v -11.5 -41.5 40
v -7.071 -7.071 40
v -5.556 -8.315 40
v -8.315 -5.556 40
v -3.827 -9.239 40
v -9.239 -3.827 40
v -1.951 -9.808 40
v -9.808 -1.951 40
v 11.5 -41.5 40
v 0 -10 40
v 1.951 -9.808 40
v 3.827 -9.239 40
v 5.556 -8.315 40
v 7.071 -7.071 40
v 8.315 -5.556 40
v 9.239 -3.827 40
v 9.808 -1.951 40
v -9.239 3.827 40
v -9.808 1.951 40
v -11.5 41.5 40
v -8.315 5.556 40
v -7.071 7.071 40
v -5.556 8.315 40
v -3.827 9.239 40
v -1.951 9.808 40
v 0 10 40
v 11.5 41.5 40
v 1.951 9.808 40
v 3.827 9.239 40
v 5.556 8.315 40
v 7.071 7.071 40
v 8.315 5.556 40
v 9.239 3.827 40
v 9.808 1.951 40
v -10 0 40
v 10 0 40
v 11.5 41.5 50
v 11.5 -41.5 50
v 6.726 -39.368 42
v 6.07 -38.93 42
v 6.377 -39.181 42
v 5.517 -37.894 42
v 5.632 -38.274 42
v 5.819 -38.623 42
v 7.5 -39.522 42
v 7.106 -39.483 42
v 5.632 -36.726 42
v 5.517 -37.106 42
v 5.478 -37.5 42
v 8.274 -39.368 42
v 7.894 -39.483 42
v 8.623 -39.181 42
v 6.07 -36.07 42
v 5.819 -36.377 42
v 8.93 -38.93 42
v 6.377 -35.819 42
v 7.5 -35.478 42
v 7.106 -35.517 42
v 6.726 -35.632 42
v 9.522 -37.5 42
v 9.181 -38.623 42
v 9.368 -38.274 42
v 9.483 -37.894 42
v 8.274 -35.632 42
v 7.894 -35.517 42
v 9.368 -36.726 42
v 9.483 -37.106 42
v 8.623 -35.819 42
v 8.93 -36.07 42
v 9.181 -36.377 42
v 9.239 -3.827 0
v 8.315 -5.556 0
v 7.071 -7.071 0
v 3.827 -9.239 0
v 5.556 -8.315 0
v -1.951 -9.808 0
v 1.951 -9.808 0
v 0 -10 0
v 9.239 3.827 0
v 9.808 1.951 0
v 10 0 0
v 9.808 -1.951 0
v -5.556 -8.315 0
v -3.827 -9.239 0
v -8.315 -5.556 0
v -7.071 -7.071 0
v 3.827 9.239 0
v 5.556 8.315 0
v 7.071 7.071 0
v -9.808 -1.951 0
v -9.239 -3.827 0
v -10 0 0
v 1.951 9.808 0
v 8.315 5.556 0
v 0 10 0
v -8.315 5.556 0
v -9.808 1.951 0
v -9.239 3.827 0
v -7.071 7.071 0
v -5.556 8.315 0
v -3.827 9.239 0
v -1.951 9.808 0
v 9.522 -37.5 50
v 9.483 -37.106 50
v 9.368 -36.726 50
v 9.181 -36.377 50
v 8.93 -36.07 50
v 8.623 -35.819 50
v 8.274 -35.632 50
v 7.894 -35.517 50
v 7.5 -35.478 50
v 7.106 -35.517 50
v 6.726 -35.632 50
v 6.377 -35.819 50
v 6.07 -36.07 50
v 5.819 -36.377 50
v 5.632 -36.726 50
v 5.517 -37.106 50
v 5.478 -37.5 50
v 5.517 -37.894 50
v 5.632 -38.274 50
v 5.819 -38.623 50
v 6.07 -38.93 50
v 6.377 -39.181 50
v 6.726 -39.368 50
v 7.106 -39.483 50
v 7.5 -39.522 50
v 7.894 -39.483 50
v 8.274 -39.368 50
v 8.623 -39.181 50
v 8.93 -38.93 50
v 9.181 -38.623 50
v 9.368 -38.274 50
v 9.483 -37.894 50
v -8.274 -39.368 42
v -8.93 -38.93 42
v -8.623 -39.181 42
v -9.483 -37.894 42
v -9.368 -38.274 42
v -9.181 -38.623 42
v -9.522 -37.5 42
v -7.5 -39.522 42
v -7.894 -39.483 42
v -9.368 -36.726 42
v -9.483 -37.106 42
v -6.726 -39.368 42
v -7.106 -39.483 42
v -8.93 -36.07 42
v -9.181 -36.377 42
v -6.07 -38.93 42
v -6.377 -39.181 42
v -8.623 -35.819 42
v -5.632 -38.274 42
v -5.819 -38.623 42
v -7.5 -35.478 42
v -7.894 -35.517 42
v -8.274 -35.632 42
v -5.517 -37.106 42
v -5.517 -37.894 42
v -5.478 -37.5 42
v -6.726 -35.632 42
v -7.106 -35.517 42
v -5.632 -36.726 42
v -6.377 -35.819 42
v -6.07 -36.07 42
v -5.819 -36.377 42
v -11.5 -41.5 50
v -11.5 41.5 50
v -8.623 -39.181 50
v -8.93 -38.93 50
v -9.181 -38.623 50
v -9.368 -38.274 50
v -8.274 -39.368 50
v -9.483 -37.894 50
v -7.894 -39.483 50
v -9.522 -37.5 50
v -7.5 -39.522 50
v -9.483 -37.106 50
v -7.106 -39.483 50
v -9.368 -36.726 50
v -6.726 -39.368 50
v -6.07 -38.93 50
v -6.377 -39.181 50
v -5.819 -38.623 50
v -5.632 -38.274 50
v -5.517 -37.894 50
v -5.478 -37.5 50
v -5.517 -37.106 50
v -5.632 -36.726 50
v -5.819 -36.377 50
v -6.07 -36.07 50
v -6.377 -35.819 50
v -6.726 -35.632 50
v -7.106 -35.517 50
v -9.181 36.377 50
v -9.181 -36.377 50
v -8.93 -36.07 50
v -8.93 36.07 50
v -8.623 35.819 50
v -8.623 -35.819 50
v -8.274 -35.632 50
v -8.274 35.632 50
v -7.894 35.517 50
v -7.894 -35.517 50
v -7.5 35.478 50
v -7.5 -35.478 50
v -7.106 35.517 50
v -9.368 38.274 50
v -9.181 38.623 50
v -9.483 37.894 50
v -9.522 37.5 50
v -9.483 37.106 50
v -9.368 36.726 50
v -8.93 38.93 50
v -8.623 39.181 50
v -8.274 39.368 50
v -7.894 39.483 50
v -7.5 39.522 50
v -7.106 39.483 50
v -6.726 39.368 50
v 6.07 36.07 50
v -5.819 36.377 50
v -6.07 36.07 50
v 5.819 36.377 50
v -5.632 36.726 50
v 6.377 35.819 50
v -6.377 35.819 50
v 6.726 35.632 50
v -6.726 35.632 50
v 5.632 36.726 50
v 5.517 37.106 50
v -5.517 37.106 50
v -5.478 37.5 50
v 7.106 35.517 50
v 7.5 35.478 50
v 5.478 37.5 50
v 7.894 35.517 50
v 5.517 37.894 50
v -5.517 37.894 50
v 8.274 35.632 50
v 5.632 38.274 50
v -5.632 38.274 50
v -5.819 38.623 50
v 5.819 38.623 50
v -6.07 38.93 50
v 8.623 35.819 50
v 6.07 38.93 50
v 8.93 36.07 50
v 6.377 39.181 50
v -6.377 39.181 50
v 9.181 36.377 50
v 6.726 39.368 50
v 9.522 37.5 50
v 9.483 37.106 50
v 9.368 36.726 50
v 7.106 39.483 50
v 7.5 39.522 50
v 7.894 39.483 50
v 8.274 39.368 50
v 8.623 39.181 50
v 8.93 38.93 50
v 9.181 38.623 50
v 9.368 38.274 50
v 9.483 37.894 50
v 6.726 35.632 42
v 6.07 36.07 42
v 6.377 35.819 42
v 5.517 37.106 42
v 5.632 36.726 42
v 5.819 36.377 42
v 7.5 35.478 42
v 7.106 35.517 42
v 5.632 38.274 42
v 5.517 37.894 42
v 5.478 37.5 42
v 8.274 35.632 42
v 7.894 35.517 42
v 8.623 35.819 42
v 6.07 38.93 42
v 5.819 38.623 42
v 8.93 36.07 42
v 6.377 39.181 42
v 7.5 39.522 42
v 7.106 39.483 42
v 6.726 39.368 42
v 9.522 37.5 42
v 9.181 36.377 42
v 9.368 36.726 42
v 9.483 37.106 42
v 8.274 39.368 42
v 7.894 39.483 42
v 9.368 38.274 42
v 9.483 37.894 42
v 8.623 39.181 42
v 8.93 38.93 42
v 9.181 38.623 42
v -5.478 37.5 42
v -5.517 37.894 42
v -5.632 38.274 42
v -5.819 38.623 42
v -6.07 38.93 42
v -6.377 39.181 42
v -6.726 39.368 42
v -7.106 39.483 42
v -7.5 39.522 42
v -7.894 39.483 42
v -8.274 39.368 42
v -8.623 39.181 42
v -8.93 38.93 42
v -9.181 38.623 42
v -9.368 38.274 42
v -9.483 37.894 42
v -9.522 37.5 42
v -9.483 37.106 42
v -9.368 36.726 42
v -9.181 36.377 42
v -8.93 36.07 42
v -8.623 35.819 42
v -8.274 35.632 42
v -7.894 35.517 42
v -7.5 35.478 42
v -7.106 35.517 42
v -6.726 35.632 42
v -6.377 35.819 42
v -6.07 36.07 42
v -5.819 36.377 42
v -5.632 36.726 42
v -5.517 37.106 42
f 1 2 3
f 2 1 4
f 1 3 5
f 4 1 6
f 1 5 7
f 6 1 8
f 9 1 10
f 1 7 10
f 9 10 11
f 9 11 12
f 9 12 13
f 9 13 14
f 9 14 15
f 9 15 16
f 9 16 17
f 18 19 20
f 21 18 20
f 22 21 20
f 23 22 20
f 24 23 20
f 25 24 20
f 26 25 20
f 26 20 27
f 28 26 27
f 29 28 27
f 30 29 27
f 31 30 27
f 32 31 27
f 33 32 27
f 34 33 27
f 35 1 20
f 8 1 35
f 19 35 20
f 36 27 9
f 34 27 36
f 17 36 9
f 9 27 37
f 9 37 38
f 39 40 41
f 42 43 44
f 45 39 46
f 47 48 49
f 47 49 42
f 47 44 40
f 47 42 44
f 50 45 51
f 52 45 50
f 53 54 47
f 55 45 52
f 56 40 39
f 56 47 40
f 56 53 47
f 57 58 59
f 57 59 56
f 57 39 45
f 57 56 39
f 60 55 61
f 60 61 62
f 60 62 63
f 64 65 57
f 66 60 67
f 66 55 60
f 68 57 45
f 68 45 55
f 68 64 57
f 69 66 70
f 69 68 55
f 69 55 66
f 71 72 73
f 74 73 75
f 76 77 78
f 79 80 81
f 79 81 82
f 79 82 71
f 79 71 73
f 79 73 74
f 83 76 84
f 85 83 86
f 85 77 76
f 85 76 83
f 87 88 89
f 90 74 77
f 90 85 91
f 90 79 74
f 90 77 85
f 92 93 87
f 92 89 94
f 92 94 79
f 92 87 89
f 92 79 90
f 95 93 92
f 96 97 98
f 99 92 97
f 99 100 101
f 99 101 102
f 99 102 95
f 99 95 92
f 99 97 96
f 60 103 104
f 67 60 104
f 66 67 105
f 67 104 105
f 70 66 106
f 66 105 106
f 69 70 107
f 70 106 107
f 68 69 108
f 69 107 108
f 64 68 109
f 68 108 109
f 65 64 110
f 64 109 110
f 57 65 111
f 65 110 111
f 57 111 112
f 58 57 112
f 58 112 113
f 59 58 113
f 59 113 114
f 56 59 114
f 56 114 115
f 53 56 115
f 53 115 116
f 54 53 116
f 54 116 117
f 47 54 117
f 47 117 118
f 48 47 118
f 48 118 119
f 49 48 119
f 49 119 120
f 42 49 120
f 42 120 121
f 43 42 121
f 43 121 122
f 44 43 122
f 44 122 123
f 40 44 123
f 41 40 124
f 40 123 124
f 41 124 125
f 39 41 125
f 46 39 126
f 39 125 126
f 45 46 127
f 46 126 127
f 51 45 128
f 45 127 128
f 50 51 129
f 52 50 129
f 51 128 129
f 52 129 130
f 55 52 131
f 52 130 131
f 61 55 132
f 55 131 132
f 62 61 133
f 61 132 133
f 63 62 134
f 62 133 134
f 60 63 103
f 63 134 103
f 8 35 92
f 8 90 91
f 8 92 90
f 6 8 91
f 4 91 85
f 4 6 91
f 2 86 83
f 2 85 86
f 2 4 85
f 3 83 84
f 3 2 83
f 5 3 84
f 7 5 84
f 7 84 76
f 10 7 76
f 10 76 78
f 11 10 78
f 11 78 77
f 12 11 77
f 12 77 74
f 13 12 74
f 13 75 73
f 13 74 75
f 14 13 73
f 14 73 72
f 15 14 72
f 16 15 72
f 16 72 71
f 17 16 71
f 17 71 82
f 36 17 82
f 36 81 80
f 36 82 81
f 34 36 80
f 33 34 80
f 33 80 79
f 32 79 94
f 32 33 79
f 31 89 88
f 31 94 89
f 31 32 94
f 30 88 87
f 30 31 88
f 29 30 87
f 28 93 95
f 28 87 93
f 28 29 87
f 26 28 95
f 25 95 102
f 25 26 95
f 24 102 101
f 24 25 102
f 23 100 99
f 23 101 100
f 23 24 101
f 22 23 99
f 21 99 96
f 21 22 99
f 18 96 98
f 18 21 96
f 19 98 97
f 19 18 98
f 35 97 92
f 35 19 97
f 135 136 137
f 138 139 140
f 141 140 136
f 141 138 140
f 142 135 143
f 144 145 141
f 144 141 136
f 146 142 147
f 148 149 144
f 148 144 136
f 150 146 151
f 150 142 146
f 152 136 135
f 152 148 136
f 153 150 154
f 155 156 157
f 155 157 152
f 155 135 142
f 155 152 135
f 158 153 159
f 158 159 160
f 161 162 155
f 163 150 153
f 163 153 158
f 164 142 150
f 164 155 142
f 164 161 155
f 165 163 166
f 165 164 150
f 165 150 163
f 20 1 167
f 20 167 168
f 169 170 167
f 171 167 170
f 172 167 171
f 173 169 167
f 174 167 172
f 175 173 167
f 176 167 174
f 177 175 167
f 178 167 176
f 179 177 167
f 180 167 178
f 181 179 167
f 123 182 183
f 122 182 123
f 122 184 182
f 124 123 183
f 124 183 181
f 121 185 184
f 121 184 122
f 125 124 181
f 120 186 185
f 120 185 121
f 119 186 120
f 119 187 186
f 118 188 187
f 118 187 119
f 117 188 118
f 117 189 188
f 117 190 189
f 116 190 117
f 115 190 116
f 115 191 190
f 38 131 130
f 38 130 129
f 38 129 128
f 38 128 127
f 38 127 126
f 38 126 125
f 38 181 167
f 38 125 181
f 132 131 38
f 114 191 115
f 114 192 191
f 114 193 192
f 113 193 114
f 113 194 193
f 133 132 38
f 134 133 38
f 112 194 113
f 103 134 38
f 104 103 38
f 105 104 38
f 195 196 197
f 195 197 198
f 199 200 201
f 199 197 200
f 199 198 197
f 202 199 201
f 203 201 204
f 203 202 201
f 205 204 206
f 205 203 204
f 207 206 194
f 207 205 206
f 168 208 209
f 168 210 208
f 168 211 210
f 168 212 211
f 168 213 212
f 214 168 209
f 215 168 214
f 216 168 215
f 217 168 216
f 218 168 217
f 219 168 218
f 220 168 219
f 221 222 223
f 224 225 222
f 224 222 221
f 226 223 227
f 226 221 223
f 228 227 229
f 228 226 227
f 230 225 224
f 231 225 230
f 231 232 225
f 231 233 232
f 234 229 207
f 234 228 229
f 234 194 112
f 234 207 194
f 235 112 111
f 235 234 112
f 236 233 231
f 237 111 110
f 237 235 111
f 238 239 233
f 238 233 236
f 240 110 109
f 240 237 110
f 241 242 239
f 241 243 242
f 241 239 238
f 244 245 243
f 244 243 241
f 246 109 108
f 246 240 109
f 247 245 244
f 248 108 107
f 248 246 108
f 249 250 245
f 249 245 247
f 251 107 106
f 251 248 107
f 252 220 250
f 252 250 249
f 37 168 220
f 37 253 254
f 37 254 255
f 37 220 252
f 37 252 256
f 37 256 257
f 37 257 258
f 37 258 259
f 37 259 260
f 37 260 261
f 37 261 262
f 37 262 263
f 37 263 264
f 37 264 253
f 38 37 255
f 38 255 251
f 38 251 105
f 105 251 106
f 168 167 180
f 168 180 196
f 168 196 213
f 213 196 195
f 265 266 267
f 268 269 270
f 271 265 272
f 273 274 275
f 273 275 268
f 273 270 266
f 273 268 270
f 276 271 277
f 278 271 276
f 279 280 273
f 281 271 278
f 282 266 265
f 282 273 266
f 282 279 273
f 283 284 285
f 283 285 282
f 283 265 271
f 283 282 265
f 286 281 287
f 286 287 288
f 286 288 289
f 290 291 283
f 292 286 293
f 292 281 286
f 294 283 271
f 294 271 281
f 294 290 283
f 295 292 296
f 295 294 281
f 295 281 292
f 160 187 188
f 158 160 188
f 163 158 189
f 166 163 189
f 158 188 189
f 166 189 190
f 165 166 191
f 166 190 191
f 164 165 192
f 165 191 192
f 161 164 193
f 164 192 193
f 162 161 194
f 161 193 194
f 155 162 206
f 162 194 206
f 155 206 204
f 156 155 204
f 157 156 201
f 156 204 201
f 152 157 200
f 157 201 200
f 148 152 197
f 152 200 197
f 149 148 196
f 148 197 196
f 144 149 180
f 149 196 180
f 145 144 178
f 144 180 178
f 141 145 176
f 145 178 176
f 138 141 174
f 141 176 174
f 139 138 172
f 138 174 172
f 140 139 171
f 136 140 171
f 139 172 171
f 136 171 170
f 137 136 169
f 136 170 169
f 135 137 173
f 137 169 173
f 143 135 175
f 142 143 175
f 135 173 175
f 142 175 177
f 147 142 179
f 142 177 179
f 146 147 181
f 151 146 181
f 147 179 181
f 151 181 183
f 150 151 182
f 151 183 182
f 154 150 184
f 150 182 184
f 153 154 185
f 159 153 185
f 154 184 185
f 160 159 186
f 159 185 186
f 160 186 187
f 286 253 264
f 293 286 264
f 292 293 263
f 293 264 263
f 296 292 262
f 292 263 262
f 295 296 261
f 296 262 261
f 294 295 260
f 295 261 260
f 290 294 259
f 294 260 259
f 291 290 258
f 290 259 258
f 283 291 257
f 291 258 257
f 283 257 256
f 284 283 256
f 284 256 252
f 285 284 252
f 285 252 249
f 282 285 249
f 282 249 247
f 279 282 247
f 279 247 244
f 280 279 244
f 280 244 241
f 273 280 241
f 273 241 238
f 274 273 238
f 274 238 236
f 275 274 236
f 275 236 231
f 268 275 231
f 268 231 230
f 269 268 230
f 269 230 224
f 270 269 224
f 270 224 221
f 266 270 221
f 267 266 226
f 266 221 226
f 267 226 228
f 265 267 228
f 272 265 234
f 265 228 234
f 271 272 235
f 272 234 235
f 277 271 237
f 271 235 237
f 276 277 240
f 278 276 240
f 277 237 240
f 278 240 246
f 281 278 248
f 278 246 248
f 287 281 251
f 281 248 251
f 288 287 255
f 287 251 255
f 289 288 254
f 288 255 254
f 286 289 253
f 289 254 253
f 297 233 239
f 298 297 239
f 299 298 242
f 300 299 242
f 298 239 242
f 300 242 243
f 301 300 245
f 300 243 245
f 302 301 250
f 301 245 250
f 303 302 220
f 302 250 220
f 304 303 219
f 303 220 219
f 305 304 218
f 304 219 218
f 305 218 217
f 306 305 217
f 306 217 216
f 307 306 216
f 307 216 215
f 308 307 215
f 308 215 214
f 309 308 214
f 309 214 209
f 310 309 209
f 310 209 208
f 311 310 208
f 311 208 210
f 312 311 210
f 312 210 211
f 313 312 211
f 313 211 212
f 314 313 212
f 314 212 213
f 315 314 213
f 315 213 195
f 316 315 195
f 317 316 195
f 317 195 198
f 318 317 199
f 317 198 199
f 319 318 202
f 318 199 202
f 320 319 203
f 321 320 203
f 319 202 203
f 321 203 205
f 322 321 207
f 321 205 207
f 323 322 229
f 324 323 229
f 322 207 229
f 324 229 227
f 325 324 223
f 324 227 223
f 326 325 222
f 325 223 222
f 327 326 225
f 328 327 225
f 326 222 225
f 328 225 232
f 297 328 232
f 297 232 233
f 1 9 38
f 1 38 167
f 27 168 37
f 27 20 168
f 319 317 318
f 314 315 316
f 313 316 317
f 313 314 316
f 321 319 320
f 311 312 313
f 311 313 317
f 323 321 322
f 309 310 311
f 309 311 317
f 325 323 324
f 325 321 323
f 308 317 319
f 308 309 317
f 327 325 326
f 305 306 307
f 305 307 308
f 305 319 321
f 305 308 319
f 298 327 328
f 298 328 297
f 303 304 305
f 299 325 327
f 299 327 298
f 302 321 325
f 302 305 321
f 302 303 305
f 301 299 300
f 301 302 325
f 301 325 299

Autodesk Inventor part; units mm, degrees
ref_plane "YZ Plane" through (0, 0, 0) normal (1, 0, 0) x (0, 1, 0)
ref_plane "XZ Plane" through (0, 0, 0) normal (0, 1, 0) x (-1, 0, 0)
ref_plane "Plano de trabajo2" through (7.156, -49.9529, 91.9135) normal (-0.1189, 0.9929, 0) x (-0.9929, -0.1189, 0)
ref_plane "Plano de trabajo5" through (0, 0, 40) normal (0, 0, 1) x (1, 0, 0)
sketch "Boceto7" plane through (0, 0, 40) normal (0, 0, 1) x (1, 0, 0)
  line L0 (-7.5, 37.5) -> (7.5, 37.5)
  line L1 (7.5, 37.5) -> (7.5, -37.5)
  line L2 (7.5, -37.5) -> (-7.5, -37.5)
  line L3 (-7.5, -37.5) -> (-7.5, 37.5)
  line L4 (-7.5, 37.5) -> (7.5, -37.5) construction
  line L5 (7.5, 37.5) -> (-7.5, -37.5) construction
  line L6 (-11.5, 41.5) -> (11.5, 41.5)
  line L7 (11.5, 41.5) -> (11.5, -41.5)
  line L8 (11.5, -41.5) -> (-11.5, -41.5)
  line L9 (-11.5, -41.5) -> (-11.5, 41.5)
  line L10 (-11.5, 41.5) -> (11.5, -41.5) construction
  line L11 (11.5, 41.5) -> (-11.5, -41.5) construction
  point P0 (0, 0)
  dimension "d18" = 15
  dimension "d19" = 75
  dimension "d32" = 23
  dimension "d33" = 83
extrude "Extrusión5" add sketch "Boceto7" along normal blind 10 contours L0 L1 L2 L3 | L6 L7 L8 L9
ref_plane "Plano de trabajo4" through (0, 0, 40) normal (0, 0, 1) x (1, 0, 0)
sketch "Boceto10" plane through (0, 0, 50) normal (0, 0, 1) x (1, 0, 0)
  line L0 (7.5, -37.5) -> (7.5, 37.5) projected
  line L1 (7.5, 37.5) -> (0, 37.5)
  line L2 (7.5, 37.5) -> (-7.5, 37.5) projected
  line L3 (3.75, 37.5) -> (3.75, 37.5)
  line L4 (0, 37.5) -> (0, 32.43)
  line L5 (0, 0) -> (7.5, 0)
  line L6 (0, 37.5) -> (7.5, 37.5)
  circle A0 centre (7.5, 37.5) radius 2.022
  circle A1 centre (-7.5, 37.5) radius 2.022
  circle A2 centre (7.5, -37.5) radius 2.022
  circle A3 centre (-7.5, -37.5) radius 2.022
  dimension "d28" = 0
  dimension "d35" = 7.5
  dimension "d36" = 4.044
  dimension "d37" = 4.044
extrude "Extrusión6" cut sketch "Boceto10" against normal blind 8
sketch "Boceto11" plane through (0, 0, 40) normal (0, 0, -1) x (-1, 0, 0)
  circle A0 centre (0, 0) radius 10
  dimension "d38" = 20
extrude "Extrusión7" add sketch "Boceto11" along normal blind 40
properties part number "UNION_B"
